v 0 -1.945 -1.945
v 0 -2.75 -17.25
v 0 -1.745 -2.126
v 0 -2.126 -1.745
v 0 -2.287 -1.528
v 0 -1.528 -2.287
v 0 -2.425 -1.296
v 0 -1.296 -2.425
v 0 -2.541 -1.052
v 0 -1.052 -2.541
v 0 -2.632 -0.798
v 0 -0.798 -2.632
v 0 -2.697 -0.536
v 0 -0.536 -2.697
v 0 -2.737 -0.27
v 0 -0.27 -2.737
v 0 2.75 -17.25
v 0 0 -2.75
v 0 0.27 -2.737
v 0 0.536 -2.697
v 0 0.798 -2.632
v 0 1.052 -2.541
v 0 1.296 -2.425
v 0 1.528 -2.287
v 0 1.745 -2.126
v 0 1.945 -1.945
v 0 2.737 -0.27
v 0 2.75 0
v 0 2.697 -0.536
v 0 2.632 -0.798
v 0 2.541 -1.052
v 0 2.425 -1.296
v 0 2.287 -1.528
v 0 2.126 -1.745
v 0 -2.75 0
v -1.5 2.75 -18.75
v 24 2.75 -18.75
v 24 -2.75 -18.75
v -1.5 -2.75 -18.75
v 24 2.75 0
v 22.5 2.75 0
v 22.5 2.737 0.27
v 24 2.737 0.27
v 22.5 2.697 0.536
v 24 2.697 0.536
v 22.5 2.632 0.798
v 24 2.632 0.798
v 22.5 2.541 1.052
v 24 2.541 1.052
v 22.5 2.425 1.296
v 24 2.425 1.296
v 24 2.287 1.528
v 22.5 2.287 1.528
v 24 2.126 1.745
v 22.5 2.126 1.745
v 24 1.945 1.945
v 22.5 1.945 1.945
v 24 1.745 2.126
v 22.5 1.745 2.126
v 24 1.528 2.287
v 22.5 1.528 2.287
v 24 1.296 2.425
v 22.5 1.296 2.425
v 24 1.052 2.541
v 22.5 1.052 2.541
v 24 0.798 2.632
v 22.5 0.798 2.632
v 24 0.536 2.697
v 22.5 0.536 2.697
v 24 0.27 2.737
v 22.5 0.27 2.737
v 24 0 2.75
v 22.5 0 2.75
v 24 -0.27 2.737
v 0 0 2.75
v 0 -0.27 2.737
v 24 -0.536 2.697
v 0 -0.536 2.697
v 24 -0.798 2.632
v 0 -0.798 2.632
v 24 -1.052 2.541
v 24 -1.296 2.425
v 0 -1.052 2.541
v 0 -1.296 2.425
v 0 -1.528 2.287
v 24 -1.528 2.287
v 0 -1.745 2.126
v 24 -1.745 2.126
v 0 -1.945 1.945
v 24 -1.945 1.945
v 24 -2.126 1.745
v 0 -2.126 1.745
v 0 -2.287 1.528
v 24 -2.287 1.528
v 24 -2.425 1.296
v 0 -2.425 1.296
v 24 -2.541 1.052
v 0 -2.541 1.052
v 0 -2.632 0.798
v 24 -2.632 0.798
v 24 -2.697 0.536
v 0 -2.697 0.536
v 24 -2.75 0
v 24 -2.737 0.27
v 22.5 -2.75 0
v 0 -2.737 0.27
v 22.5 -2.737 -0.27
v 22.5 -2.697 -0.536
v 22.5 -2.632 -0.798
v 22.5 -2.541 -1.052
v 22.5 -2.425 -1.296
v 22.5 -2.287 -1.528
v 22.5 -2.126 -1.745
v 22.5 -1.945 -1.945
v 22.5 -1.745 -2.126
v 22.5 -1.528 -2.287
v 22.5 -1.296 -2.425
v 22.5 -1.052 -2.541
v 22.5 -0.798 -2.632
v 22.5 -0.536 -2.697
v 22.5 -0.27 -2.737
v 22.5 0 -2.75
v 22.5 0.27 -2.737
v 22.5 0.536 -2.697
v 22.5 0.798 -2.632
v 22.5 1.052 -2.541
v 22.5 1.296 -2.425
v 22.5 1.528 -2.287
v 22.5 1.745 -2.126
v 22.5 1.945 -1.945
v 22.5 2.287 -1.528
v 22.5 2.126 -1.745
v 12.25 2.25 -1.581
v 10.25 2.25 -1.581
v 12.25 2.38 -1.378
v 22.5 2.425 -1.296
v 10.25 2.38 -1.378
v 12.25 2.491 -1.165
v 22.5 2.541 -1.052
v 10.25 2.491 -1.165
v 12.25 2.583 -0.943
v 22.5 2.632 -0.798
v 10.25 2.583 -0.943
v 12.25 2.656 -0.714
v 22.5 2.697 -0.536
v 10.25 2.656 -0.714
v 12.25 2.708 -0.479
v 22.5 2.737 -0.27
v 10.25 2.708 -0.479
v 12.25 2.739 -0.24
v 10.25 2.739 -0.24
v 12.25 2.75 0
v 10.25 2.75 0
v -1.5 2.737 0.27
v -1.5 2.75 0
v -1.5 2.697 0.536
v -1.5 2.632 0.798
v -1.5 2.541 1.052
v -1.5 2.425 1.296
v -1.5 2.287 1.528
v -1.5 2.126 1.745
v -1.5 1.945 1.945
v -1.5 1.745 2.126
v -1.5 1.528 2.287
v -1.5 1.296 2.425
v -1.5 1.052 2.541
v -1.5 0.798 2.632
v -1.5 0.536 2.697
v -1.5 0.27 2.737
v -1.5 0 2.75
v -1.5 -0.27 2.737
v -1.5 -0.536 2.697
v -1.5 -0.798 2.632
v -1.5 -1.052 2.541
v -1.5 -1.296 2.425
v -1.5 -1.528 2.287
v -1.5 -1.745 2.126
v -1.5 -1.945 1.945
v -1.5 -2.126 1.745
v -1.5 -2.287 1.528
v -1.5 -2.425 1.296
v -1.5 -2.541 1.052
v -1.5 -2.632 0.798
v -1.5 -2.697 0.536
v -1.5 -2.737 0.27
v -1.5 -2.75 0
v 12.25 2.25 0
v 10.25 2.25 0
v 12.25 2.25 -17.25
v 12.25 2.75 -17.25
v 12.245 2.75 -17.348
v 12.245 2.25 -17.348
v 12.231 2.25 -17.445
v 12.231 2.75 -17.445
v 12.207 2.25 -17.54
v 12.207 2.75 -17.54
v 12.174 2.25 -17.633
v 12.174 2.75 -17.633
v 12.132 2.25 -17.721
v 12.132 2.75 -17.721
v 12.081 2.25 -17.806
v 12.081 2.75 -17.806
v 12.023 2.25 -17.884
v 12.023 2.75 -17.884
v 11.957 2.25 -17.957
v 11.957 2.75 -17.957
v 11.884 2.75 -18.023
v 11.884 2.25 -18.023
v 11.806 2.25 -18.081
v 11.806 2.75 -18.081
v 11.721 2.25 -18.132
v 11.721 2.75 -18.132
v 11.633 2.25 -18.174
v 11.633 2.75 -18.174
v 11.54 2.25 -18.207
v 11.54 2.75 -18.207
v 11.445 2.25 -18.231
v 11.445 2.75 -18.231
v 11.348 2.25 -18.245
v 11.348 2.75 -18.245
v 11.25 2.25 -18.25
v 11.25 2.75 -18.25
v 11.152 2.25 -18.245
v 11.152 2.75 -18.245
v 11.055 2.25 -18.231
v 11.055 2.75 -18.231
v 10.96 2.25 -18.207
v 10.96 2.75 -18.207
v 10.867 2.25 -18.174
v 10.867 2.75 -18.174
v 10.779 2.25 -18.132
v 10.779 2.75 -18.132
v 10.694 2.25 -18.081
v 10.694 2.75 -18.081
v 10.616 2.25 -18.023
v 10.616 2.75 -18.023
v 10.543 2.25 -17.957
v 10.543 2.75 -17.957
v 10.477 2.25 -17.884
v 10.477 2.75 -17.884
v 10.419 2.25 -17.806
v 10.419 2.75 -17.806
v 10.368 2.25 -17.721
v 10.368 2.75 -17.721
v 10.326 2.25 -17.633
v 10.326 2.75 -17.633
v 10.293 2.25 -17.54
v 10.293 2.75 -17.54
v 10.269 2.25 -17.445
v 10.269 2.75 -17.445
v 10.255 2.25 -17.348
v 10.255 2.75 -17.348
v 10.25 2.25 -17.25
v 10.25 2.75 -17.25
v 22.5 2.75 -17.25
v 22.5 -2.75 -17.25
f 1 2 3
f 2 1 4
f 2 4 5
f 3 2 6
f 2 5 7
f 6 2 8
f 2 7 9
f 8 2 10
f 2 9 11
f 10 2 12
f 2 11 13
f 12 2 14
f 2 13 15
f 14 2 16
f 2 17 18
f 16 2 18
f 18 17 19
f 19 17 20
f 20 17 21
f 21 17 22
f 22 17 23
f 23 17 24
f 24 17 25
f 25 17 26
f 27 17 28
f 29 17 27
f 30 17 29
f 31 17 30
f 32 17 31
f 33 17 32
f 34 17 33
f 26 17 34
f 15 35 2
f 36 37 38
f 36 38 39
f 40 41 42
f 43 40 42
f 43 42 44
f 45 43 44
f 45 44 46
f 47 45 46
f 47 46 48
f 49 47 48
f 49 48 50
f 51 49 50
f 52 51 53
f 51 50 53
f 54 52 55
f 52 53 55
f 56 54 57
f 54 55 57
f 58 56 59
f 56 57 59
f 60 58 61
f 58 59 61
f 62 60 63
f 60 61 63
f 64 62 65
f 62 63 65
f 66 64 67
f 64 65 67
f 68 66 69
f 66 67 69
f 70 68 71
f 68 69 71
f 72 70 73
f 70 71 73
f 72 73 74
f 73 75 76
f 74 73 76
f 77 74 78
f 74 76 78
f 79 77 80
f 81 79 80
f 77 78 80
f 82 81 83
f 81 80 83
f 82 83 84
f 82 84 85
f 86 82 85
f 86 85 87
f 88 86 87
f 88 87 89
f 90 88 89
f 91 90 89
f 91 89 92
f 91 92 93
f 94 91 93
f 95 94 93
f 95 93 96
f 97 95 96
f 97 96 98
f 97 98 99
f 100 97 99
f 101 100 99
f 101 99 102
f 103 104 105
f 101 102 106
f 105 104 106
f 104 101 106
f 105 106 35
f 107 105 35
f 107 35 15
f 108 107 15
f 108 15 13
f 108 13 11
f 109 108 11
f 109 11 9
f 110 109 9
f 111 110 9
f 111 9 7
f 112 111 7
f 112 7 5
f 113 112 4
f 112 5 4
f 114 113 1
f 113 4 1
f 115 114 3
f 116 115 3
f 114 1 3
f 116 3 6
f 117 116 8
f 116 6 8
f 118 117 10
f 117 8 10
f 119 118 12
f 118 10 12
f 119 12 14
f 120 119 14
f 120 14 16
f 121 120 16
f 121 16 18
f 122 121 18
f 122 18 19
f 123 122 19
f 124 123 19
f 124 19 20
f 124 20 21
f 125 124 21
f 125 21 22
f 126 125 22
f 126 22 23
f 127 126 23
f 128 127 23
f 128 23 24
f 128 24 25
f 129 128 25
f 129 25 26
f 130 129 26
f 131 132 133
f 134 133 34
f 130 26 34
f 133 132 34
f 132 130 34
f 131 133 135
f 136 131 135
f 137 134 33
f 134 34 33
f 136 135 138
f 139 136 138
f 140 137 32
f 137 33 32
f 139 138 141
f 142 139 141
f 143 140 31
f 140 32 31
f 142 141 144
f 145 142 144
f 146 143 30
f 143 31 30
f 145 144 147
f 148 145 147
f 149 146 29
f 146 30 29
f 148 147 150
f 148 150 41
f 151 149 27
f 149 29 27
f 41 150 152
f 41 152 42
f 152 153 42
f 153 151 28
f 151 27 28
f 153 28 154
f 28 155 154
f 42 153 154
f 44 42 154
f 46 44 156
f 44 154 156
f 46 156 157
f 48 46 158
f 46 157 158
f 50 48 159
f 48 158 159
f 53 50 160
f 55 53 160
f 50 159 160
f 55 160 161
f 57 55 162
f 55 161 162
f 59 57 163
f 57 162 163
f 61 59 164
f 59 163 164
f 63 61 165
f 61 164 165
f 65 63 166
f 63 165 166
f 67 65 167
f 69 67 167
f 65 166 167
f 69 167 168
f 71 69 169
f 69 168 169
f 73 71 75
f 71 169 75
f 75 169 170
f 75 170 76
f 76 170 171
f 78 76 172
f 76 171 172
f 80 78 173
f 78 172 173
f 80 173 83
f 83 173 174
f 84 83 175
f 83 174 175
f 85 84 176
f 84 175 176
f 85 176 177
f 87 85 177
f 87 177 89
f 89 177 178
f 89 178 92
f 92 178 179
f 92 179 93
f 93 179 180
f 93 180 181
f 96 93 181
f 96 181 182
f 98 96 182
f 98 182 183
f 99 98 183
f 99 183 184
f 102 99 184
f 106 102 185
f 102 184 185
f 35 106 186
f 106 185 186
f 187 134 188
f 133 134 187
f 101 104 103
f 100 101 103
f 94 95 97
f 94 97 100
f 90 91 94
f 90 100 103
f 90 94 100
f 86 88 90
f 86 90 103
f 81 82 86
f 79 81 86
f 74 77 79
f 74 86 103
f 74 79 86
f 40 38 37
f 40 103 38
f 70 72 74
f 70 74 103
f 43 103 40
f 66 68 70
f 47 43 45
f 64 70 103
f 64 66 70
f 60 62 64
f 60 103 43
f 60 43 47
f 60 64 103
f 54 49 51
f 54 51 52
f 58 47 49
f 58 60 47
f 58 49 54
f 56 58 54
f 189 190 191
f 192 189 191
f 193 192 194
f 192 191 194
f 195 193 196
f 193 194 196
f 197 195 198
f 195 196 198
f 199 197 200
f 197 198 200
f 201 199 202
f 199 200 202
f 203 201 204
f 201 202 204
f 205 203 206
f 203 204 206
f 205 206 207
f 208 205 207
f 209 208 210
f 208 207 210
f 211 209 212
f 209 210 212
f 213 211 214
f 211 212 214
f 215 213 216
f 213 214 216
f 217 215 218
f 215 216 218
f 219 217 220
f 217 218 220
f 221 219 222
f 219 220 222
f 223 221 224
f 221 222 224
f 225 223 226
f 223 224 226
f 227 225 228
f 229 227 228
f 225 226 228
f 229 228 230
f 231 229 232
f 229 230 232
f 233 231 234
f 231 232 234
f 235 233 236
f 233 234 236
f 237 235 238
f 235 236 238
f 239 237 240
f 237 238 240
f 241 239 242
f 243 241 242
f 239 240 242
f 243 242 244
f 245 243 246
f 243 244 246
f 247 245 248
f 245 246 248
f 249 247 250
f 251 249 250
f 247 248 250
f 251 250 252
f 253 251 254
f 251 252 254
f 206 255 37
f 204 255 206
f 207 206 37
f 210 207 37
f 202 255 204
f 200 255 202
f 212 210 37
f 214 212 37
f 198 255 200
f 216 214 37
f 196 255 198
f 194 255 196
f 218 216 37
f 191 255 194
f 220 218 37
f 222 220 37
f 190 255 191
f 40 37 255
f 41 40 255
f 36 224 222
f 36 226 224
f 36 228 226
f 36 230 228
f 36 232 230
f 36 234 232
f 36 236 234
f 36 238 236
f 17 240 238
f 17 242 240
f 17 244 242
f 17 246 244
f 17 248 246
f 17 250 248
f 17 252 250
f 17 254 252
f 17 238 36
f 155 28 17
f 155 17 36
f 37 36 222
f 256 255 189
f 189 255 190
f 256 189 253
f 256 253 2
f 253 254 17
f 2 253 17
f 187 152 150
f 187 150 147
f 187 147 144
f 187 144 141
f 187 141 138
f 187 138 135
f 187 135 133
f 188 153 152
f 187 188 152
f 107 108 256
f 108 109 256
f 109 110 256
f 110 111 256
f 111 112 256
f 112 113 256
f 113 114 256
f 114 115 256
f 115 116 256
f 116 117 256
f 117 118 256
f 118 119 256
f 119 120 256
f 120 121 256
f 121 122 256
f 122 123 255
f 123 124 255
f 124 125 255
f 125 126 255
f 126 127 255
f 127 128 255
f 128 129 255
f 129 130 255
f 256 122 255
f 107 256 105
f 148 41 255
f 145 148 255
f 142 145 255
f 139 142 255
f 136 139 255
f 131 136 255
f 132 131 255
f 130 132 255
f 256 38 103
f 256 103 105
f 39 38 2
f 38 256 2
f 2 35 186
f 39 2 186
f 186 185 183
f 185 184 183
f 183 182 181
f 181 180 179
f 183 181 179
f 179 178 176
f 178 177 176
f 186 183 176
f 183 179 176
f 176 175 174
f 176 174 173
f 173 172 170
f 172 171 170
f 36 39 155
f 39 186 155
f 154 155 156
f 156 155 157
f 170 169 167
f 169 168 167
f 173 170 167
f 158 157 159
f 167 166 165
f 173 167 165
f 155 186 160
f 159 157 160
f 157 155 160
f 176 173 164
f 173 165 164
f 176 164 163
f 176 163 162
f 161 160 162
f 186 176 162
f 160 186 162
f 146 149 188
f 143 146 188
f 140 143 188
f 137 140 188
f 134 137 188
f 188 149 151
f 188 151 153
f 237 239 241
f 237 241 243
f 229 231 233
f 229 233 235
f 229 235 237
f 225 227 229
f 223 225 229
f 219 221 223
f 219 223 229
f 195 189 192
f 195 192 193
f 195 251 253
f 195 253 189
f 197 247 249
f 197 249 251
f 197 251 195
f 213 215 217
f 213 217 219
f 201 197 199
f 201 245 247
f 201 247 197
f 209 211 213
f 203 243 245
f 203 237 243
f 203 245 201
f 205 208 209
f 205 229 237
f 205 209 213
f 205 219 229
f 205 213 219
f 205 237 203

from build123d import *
from build123d.topology import SkipClean

# Parameters (mm, degrees)
SKETCH1_R           = 2.75
BOSS_EXTRUDE1_DEPTH = 22.5
BOSS_EXTRUDE2_START = 1.5
BOSS_EXTRUDE2_DEPTH = 1.5
BOSS_EXTRUDE3_DEPTH = 1.5
SKETCH5_W           = 25.5
SKETCH5_H           = 5.5
BOSS_EXTRUDE4_DEPTH = 1.5
CUT_EXTRUDE1_DEPTH  = 0.5


with BuildPart() as part:
    # Sketch1 → Boss-Extrude1 (new body)
    with BuildSketch(Plane(origin=(0, 0, 0), x_dir=(0, 0, -1), z_dir=(1, 0, 0))):
        with Locations(Location((0, 0, 0), (0, 0, 180))):
            Circle(SKETCH1_R)
    extrude(amount=BOSS_EXTRUDE1_DEPTH)

    # Sketch2 → Boss-Extrude2 (add)
    with SkipClean():  # the faces are left unmerged after this step: merging them gives an invalid solid
        with BuildSketch(Plane.ZY.offset(BOSS_EXTRUDE2_START)):
            with BuildLine():
                Line((0, 2.75), (-17.25, 2.75))
                Line((-17.25, 2.75), (-17.25, -2.75))
                Line((-17.25, -2.75), (0, -2.75))
                ThreePointArc((0, -2.75), (2.75, 0), (0, 2.75))
            make_face()
        extrude(amount=-BOSS_EXTRUDE2_DEPTH)

    # Sketch3 → Boss-Extrude3 (add)
    with BuildSketch(Plane(origin=(22.5, 0, 0), x_dir=(0, 0, -1), z_dir=(1, 0, 0))):
        with BuildLine():
            Line((0, -2.75), (17.25, -2.75))
            Line((17.25, -2.75), (17.25, 2.75))
            Line((17.25, 2.75), (0, 2.75))
            ThreePointArc((0, 2.75), (-2.75, 0), (0, -2.75))
        make_face()
    extrude(amount=BOSS_EXTRUDE3_DEPTH)

    # Sketch5 → Boss-Extrude4 (add)
    with BuildSketch(Plane(origin=(0, 0, -17.25), x_dir=(-1, 0, 0), z_dir=(0, 0, -1))):
        with Locations((-11.25, 0)):
            Rectangle(SKETCH5_W, SKETCH5_H)
    extrude(amount=BOSS_EXTRUDE4_DEPTH)

    # Sketch6 → Cut-Extrude1 (cut)
    with BuildSketch(Plane(origin=(0, 2.75, 0), x_dir=(1, 0, 0), z_dir=(0, 1, 0))):
        with BuildLine():
            Line((10.25, 17.25), (10.25, 0))
            Line((10.25, 0), (12.25, 0))
            Line((12.25, 0), (12.25, 17.25))
            ThreePointArc((12.25, 17.25), (11.25, 18.25), (10.25, 17.25))
        make_face()
    extrude(amount=-CUT_EXTRUDE1_DEPTH, mode=Mode.SUBTRACT)


solid = part.part
